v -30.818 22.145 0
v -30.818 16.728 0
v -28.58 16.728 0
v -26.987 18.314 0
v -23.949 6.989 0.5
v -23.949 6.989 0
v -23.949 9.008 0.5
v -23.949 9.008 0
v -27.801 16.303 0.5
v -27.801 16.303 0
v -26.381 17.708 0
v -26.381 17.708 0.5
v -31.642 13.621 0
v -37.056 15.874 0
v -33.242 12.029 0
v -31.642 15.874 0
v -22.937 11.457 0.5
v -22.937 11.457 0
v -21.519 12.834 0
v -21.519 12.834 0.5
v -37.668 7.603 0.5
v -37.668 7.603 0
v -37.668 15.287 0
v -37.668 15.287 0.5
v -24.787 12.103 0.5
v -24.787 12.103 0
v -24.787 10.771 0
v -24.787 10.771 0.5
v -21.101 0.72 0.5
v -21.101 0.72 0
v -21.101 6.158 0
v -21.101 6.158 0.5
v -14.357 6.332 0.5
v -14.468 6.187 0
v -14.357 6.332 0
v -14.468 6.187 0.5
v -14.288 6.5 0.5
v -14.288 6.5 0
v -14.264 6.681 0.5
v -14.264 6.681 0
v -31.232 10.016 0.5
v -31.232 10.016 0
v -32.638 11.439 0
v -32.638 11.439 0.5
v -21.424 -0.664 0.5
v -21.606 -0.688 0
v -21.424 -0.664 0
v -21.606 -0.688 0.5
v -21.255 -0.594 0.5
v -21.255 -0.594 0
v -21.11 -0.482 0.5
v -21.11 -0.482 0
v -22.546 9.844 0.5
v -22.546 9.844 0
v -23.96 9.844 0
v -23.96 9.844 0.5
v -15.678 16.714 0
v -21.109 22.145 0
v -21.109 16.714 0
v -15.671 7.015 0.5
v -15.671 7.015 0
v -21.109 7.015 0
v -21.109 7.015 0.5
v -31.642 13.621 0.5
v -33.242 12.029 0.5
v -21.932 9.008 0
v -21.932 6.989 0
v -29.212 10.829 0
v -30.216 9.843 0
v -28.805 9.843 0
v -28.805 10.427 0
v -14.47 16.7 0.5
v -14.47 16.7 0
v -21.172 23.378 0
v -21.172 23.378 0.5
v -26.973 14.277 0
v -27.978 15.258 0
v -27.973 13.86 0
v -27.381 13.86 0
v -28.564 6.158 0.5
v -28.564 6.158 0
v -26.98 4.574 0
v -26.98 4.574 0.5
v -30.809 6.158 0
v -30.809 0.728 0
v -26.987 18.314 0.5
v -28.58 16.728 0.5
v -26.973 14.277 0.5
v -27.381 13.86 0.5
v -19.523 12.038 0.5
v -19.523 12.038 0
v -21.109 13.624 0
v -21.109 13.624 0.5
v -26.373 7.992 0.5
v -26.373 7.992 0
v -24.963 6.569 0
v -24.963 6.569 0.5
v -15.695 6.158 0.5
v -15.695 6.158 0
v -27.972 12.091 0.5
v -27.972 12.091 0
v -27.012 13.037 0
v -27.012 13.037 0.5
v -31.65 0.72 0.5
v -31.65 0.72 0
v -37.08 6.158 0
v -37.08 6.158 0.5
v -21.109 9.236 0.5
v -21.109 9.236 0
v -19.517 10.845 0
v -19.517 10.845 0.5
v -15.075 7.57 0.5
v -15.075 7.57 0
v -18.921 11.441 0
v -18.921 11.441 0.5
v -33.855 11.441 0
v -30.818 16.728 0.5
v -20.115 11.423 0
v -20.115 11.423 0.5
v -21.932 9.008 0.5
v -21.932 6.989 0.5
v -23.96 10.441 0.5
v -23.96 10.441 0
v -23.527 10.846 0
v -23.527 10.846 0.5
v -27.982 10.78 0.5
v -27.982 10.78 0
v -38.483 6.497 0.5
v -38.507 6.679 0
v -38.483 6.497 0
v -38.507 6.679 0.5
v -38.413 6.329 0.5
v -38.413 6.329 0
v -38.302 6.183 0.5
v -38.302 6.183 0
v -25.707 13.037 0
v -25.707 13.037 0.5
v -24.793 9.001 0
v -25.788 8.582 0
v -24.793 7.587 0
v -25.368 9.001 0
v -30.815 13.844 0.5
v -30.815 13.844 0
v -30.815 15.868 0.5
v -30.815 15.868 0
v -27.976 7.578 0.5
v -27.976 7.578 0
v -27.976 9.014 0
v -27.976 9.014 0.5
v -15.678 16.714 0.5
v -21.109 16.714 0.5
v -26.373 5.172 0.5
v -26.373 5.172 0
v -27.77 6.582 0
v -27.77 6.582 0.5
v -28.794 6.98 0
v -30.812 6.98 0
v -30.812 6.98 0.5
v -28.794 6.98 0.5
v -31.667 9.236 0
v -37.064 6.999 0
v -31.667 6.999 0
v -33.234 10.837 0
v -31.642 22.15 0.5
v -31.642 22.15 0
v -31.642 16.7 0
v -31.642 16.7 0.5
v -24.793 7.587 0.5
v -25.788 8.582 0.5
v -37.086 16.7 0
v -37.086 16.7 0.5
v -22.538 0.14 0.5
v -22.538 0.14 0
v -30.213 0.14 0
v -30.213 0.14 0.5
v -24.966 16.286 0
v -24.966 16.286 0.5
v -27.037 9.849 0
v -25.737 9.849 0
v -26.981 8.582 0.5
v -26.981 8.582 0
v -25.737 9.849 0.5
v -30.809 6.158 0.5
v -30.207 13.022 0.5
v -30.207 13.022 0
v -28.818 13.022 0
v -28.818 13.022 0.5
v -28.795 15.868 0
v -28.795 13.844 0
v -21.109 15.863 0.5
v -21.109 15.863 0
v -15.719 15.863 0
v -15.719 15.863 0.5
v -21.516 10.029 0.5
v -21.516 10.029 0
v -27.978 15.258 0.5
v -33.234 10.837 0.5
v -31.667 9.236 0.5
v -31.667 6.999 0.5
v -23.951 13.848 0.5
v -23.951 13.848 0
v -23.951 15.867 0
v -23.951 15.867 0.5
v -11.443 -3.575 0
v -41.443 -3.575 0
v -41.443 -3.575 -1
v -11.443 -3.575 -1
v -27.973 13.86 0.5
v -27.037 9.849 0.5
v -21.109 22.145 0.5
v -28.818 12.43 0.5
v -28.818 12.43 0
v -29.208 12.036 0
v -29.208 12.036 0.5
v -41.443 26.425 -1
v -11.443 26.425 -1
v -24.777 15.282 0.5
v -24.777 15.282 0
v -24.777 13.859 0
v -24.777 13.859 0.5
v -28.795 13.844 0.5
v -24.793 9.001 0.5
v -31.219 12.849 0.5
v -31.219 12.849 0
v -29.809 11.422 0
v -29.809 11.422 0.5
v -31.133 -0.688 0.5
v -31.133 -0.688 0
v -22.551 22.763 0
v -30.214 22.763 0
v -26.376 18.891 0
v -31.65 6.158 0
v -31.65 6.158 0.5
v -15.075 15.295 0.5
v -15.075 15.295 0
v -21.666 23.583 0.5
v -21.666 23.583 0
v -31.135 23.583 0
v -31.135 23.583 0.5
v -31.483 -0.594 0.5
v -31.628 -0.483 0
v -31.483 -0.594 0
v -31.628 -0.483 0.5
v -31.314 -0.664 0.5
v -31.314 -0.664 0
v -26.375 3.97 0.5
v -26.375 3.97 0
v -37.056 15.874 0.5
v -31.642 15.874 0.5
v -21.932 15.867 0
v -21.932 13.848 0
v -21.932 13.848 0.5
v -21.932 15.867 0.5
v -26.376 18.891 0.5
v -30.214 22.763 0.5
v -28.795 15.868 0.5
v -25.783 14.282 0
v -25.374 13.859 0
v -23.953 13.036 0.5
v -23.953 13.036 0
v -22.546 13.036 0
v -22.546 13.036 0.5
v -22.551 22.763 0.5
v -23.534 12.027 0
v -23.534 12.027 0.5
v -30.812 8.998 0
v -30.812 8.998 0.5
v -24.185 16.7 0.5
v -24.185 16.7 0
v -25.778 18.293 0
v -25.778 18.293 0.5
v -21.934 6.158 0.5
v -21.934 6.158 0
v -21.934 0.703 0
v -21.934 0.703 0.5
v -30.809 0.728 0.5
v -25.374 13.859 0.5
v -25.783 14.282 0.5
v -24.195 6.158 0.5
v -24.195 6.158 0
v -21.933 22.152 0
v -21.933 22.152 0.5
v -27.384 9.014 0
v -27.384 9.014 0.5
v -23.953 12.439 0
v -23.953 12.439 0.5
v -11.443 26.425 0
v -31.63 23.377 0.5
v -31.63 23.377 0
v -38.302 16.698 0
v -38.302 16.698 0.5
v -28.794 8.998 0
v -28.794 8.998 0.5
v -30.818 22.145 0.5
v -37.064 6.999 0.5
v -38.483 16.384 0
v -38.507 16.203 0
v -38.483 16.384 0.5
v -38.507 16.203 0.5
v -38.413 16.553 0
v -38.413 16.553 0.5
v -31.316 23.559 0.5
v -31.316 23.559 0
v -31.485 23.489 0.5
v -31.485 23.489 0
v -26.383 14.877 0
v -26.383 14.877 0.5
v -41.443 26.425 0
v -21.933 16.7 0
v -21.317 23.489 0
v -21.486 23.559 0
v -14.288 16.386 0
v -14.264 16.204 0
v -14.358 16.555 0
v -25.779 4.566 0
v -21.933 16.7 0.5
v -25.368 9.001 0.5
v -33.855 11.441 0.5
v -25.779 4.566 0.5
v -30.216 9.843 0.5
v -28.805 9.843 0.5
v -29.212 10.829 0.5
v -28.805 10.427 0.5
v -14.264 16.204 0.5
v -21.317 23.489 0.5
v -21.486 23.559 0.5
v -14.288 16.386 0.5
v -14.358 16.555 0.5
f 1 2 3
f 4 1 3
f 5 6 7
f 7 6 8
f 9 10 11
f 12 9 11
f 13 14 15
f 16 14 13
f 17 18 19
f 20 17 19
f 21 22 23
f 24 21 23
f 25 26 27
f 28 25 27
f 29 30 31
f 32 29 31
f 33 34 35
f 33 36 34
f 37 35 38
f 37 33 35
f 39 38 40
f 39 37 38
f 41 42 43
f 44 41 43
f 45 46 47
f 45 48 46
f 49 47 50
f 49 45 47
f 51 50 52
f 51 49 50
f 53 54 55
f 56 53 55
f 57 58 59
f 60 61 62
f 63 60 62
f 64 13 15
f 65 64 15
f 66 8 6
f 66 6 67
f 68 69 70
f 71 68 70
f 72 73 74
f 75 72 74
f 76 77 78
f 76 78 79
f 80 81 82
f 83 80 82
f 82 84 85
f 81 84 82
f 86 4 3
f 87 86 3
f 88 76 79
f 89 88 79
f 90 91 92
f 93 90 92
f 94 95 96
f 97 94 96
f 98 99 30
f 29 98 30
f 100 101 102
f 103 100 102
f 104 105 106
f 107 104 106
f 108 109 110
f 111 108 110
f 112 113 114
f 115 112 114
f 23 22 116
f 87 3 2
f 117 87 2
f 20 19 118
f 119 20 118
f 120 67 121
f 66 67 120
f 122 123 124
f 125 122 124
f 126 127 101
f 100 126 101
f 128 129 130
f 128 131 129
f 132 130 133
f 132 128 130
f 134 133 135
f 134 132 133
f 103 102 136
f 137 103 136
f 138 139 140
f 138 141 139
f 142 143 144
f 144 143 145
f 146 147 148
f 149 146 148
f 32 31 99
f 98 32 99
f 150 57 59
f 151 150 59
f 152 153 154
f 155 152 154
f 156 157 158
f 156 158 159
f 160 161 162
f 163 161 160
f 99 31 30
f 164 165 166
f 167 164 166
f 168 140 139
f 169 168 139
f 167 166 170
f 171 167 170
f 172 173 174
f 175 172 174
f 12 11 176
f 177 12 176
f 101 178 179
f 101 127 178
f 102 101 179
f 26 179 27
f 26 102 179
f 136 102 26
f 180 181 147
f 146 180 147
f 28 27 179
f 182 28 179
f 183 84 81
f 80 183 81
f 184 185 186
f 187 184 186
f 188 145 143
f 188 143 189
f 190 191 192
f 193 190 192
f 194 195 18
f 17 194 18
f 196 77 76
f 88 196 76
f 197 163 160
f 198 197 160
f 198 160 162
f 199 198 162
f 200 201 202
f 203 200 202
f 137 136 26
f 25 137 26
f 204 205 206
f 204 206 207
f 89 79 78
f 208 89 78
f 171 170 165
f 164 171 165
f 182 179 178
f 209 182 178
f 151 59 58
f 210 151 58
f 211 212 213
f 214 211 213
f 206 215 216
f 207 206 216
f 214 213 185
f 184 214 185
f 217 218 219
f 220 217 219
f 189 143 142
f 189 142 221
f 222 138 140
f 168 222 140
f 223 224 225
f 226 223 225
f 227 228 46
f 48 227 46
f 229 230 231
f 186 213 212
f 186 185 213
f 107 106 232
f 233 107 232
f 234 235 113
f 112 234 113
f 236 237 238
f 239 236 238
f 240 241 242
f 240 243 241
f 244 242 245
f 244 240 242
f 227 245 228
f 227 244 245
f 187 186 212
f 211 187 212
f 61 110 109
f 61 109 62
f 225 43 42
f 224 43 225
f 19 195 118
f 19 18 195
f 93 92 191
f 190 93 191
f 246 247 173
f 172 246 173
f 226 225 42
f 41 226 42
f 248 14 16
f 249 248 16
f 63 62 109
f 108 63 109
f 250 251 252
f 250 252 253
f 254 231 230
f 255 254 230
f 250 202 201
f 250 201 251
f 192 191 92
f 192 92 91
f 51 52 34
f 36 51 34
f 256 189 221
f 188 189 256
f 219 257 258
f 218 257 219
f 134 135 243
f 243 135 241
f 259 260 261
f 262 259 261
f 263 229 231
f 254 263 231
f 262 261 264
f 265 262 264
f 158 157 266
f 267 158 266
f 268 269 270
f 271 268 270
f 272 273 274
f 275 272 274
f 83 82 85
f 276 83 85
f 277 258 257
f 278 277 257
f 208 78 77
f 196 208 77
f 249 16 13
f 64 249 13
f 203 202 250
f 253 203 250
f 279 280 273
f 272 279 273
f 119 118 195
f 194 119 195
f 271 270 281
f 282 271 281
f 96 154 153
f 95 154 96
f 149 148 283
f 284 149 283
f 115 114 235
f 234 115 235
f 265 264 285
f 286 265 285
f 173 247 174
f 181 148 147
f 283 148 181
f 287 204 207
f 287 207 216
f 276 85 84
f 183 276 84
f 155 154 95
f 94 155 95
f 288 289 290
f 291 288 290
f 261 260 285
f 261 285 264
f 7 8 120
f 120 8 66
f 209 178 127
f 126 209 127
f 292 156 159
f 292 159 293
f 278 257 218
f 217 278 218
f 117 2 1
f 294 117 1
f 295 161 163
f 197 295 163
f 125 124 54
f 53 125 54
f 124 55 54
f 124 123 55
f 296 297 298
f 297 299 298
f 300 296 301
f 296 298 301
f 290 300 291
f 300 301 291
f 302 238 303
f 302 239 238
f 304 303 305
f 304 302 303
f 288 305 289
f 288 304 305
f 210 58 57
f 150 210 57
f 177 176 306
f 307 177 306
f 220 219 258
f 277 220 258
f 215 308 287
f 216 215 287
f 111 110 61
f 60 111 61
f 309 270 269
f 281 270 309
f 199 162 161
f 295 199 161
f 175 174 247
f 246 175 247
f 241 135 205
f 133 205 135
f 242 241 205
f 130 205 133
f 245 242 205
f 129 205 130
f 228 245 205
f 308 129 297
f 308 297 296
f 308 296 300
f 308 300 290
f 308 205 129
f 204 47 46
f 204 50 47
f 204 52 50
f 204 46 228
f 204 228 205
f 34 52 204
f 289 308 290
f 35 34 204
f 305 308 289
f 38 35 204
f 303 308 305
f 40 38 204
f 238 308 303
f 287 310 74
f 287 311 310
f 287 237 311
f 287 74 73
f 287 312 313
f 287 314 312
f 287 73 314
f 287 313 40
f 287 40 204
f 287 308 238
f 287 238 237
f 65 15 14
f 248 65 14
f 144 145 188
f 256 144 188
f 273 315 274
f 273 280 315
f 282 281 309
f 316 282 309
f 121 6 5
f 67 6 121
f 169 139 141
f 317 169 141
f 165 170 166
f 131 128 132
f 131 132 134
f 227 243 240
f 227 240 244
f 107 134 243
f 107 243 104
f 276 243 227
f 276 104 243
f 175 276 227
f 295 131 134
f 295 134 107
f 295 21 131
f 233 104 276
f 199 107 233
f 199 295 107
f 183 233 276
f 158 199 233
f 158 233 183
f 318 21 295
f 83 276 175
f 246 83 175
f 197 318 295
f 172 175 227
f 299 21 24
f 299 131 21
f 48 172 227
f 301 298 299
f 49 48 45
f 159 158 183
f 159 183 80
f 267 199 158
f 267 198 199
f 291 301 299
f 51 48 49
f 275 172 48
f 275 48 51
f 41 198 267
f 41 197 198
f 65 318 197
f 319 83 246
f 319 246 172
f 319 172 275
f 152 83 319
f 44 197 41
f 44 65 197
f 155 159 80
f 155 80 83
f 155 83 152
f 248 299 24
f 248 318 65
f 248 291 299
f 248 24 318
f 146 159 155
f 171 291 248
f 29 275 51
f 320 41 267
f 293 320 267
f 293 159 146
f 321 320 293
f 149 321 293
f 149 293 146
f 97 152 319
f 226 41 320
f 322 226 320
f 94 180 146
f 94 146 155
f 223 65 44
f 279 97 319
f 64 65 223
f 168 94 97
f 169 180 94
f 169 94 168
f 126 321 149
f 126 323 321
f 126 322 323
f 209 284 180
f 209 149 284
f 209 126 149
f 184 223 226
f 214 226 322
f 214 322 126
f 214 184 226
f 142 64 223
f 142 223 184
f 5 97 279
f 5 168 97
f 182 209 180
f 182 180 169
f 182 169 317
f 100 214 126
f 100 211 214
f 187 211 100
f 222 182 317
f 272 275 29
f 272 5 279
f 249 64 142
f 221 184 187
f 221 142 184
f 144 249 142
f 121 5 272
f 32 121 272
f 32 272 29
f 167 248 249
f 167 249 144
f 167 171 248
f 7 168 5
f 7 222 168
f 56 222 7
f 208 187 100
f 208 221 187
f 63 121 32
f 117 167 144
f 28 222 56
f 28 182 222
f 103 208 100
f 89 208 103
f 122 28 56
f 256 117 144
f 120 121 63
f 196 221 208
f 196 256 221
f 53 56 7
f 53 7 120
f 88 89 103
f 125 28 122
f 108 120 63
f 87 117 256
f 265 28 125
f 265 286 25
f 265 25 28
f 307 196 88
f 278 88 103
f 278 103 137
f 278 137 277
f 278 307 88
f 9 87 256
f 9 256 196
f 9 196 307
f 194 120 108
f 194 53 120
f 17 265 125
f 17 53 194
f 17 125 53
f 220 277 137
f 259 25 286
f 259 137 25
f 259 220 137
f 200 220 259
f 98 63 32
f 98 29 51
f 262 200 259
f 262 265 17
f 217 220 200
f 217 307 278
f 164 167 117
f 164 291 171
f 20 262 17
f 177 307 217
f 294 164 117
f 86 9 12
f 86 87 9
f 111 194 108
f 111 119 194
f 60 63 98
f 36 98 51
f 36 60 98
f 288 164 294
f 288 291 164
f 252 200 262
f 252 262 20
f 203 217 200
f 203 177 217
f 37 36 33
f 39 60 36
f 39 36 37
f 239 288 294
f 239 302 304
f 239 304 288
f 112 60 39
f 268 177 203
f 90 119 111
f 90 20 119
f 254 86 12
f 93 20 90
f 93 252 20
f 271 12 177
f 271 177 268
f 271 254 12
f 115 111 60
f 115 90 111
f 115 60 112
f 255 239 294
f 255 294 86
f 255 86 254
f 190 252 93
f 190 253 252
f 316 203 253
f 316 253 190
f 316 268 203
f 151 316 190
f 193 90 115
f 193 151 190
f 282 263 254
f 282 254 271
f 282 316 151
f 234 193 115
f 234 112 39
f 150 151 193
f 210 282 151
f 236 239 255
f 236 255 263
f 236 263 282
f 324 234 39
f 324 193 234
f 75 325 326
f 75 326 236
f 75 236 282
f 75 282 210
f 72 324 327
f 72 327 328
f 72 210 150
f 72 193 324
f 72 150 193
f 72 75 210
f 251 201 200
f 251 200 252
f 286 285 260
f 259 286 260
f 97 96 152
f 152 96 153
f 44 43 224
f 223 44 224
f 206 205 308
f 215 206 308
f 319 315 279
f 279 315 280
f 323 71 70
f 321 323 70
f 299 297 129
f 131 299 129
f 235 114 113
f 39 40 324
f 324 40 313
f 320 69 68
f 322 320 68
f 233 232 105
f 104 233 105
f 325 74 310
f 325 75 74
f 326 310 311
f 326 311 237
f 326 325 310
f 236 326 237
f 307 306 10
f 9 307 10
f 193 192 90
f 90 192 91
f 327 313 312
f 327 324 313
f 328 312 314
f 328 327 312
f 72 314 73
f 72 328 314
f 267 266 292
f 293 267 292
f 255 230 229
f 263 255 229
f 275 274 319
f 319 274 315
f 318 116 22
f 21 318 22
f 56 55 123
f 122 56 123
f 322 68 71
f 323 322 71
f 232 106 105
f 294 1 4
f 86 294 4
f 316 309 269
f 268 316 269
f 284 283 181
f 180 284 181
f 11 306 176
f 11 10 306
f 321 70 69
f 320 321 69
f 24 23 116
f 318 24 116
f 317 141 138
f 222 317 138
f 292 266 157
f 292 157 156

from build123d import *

# Parameters (mm, degrees)
F0_W     = 30
F0_H     = 30
F1_DEPTH = 1
F2_W     = 2.018653
F2_H     = 2.018654
F2_W_2   = 2.016375
F2_H_2   = 2.0191
F2_W_3   = 2.019964
F2_H_3   = 2.024288
F2_W_4   = 2.01923
F2_H_4   = 2.01923
F3_DEPTH = 0.5
F4_R     = 0.7


with BuildPart() as f1:
    # F0 (on Top) → F1 (new body)
    with BuildSketch(Plane.XY):
        with Locations((-26.442633, 11.425064)):
            Rectangle(F0_W, F0_H)
    extrude(amount=-F1_DEPTH)

    # F2 (on face) → F3 (join)
    with BuildSketch(Plane.XY):
        Polygon((-38.507011, 16.492767), (-38.507011, 6.388553), (-31.423131, -0.68813), (-21.315051, -0.68813), (-14.263901, 6.391955), (-14.263901, 16.494762), (-21.377073, 23.582622), (-31.424855, 23.582622), align=None)
        Polygon((-31.650189, 6.157815), (-31.650189, 0.719746), (-37.080094, 6.157815), align=None, mode=Mode.SUBTRACT)
        Polygon((-26.979655, 4.573753), (-30.809168, 0.727911), (-30.809168, 6.157815), (-28.563717, 6.157815), align=None, mode=Mode.SUBTRACT)
        Polygon((-33.854812, 11.440743), (-37.667993, 7.603067), (-37.667993, 15.286584), align=None, mode=Mode.SUBTRACT)
        Polygon((-31.666521, 6.998837), (-37.063763, 6.998837), (-33.23425, 10.836514), (-31.666521, 9.236122), align=None, mode=Mode.SUBTRACT)
        with Locations((-29.803097, 7.989094)):
            Rectangle(F2_W, F2_H, mode=Mode.SUBTRACT)
        Polygon((-26.981462, 8.58155), (-27.976304, 7.578057), (-27.976304, 9.014091), (-27.383724, 9.014091), align=None, mode=Mode.SUBTRACT)
        Polygon((-31.231981, 10.016147), (-32.637738, 11.439203), (-31.219007, 12.849177), (-29.809005, 11.421824), align=None, mode=Mode.SUBTRACT)
        Polygon((-28.805431, 9.843131), (-30.215511, 9.843131), (-29.212018, 10.829322), (-28.805431, 10.42706), align=None, mode=Mode.SUBTRACT)
        Polygon((-22.537747, 0.140012), (-30.213101, 0.140012), (-26.375424, 3.969523), align=None, mode=Mode.SUBTRACT)
        Polygon((-25.779359, 4.565588), (-24.195297, 6.157815), (-21.933518, 6.157815), (-21.933518, 0.703416), align=None, mode=Mode.SUBTRACT)
        Polygon((-15.695253, 6.157815), (-21.100661, 0.719746), (-21.100661, 6.157815), align=None, mode=Mode.SUBTRACT)
        Polygon((-27.769718, 6.581786), (-26.372593, 7.991966), (-24.962511, 6.56891), (-26.372533, 5.171744), align=None, mode=Mode.SUBTRACT)
        Polygon((-25.787652, 8.58155), (-25.368089, 9.001114), (-24.792811, 9.001114), (-24.792811, 7.586708), align=None, mode=Mode.SUBTRACT)
        with Locations((-22.940554, 7.998101)):
            Rectangle(F2_W_2, F2_H_2, mode=Mode.SUBTRACT)
        Polygon((-27.037146, 9.849087), (-27.982378, 10.779787), (-27.972091, 12.091455), (-27.011622, 13.036678), (-25.707053, 13.036678), (-24.78699, 12.102881), (-24.78699, 10.77085), (-25.736685, 9.849087), align=None, mode=Mode.SUBTRACT)
        Polygon((-23.960013, 9.843515), (-23.960013, 10.44087), (-23.527445, 10.845972), (-22.545587, 9.843515), align=None, mode=Mode.SUBTRACT)
        Polygon((-21.515666, 10.028902), (-22.936957, 11.45706), (-21.519115, 12.833655), (-20.115038, 11.422795), align=None, mode=Mode.SUBTRACT)
        Polygon((-21.108827, 7.015169), (-21.108827, 9.236122), (-19.516598, 10.84468), (-15.670758, 7.015169), align=None, mode=Mode.SUBTRACT)
        Polygon((-18.920535, 11.440744), (-15.074693, 15.294751), (-15.074693, 7.570407), align=None, mode=Mode.SUBTRACT)
        Polygon((-33.242416, 12.028642), (-37.055597, 15.874484), (-31.642023, 15.874484), (-31.642023, 13.620869), align=None, mode=Mode.SUBTRACT)
        Polygon((-29.207693, 12.036108), (-30.206861, 13.0223), (-28.818408, 13.0223), (-28.818408, 12.42972), align=None, mode=Mode.SUBTRACT)
        with Locations((-29.805265, 14.856238)):
            Rectangle(F2_W_3, F2_H_3, mode=Mode.SUBTRACT)
        Polygon((-27.381008, 13.859744), (-27.973332, 13.859744), (-27.977619, 15.258362), (-26.97318, 14.277282), align=None, mode=Mode.SUBTRACT)
        Polygon((-31.641971, 16.700408), (-37.086085, 16.700408), (-31.641971, 22.150441), align=None, mode=Mode.SUBTRACT)
        Polygon((-30.818034, 16.727873), (-30.818034, 22.145262), (-26.986726, 18.313954), (-28.579671, 16.727873), align=None, mode=Mode.SUBTRACT)
        Polygon((-23.534311, 12.02695), (-23.953147, 12.438918), (-23.953147, 13.036272), (-22.545587, 13.036272), align=None, mode=Mode.SUBTRACT)
        Polygon((-24.777411, 13.859262), (-25.37415, 13.859262), (-25.782874, 14.281611), (-24.777411, 15.281624), align=None, mode=Mode.SUBTRACT)
        Polygon((-26.382677, 14.877413), (-27.800711, 16.303259), (-26.380666, 17.707815), (-24.966487, 16.285844), align=None, mode=Mode.SUBTRACT)
        with Locations((-22.941211, 14.857687)):
            Rectangle(F2_W_4, F2_H_4, mode=Mode.SUBTRACT)
        Polygon((-19.523224, 12.038295), (-21.109303, 13.624375), (-21.109303, 15.862739), (-15.719378, 15.862739), align=None, mode=Mode.SUBTRACT)
        Polygon((-25.778282, 18.293355), (-21.933241, 22.152128), (-21.933241, 16.700408), (-24.185337, 16.700408), align=None, mode=Mode.SUBTRACT)
        Polygon((-26.375638, 18.890709), (-30.213814, 22.763215), (-22.551196, 22.763215), align=None, mode=Mode.SUBTRACT)
        Polygon((-21.109303, 16.714141), (-21.109303, 22.145262), (-15.678182, 16.714141), align=None, mode=Mode.SUBTRACT)
    extrude(amount=F3_DEPTH)

    # F4
    f4_edges = [f1.edges().sort_by_distance(p)[0] for p in [
        (-14.263901, 16.494762, 0.25),
        (-14.263901, 6.391955, 0.25),
        (-21.315051, -0.68813, 0.25),
        (-31.423131, -0.68813, 0.25),
        (-38.507011, 6.388553, 0.25),
        (-21.377073, 23.582622, 0.25),
        (-31.424855, 23.582622, 0.25),
        (-38.507011, 16.492767, 0.25),
    ]]
    fillet(f4_edges, radius=F4_R)


solid = f1.part
